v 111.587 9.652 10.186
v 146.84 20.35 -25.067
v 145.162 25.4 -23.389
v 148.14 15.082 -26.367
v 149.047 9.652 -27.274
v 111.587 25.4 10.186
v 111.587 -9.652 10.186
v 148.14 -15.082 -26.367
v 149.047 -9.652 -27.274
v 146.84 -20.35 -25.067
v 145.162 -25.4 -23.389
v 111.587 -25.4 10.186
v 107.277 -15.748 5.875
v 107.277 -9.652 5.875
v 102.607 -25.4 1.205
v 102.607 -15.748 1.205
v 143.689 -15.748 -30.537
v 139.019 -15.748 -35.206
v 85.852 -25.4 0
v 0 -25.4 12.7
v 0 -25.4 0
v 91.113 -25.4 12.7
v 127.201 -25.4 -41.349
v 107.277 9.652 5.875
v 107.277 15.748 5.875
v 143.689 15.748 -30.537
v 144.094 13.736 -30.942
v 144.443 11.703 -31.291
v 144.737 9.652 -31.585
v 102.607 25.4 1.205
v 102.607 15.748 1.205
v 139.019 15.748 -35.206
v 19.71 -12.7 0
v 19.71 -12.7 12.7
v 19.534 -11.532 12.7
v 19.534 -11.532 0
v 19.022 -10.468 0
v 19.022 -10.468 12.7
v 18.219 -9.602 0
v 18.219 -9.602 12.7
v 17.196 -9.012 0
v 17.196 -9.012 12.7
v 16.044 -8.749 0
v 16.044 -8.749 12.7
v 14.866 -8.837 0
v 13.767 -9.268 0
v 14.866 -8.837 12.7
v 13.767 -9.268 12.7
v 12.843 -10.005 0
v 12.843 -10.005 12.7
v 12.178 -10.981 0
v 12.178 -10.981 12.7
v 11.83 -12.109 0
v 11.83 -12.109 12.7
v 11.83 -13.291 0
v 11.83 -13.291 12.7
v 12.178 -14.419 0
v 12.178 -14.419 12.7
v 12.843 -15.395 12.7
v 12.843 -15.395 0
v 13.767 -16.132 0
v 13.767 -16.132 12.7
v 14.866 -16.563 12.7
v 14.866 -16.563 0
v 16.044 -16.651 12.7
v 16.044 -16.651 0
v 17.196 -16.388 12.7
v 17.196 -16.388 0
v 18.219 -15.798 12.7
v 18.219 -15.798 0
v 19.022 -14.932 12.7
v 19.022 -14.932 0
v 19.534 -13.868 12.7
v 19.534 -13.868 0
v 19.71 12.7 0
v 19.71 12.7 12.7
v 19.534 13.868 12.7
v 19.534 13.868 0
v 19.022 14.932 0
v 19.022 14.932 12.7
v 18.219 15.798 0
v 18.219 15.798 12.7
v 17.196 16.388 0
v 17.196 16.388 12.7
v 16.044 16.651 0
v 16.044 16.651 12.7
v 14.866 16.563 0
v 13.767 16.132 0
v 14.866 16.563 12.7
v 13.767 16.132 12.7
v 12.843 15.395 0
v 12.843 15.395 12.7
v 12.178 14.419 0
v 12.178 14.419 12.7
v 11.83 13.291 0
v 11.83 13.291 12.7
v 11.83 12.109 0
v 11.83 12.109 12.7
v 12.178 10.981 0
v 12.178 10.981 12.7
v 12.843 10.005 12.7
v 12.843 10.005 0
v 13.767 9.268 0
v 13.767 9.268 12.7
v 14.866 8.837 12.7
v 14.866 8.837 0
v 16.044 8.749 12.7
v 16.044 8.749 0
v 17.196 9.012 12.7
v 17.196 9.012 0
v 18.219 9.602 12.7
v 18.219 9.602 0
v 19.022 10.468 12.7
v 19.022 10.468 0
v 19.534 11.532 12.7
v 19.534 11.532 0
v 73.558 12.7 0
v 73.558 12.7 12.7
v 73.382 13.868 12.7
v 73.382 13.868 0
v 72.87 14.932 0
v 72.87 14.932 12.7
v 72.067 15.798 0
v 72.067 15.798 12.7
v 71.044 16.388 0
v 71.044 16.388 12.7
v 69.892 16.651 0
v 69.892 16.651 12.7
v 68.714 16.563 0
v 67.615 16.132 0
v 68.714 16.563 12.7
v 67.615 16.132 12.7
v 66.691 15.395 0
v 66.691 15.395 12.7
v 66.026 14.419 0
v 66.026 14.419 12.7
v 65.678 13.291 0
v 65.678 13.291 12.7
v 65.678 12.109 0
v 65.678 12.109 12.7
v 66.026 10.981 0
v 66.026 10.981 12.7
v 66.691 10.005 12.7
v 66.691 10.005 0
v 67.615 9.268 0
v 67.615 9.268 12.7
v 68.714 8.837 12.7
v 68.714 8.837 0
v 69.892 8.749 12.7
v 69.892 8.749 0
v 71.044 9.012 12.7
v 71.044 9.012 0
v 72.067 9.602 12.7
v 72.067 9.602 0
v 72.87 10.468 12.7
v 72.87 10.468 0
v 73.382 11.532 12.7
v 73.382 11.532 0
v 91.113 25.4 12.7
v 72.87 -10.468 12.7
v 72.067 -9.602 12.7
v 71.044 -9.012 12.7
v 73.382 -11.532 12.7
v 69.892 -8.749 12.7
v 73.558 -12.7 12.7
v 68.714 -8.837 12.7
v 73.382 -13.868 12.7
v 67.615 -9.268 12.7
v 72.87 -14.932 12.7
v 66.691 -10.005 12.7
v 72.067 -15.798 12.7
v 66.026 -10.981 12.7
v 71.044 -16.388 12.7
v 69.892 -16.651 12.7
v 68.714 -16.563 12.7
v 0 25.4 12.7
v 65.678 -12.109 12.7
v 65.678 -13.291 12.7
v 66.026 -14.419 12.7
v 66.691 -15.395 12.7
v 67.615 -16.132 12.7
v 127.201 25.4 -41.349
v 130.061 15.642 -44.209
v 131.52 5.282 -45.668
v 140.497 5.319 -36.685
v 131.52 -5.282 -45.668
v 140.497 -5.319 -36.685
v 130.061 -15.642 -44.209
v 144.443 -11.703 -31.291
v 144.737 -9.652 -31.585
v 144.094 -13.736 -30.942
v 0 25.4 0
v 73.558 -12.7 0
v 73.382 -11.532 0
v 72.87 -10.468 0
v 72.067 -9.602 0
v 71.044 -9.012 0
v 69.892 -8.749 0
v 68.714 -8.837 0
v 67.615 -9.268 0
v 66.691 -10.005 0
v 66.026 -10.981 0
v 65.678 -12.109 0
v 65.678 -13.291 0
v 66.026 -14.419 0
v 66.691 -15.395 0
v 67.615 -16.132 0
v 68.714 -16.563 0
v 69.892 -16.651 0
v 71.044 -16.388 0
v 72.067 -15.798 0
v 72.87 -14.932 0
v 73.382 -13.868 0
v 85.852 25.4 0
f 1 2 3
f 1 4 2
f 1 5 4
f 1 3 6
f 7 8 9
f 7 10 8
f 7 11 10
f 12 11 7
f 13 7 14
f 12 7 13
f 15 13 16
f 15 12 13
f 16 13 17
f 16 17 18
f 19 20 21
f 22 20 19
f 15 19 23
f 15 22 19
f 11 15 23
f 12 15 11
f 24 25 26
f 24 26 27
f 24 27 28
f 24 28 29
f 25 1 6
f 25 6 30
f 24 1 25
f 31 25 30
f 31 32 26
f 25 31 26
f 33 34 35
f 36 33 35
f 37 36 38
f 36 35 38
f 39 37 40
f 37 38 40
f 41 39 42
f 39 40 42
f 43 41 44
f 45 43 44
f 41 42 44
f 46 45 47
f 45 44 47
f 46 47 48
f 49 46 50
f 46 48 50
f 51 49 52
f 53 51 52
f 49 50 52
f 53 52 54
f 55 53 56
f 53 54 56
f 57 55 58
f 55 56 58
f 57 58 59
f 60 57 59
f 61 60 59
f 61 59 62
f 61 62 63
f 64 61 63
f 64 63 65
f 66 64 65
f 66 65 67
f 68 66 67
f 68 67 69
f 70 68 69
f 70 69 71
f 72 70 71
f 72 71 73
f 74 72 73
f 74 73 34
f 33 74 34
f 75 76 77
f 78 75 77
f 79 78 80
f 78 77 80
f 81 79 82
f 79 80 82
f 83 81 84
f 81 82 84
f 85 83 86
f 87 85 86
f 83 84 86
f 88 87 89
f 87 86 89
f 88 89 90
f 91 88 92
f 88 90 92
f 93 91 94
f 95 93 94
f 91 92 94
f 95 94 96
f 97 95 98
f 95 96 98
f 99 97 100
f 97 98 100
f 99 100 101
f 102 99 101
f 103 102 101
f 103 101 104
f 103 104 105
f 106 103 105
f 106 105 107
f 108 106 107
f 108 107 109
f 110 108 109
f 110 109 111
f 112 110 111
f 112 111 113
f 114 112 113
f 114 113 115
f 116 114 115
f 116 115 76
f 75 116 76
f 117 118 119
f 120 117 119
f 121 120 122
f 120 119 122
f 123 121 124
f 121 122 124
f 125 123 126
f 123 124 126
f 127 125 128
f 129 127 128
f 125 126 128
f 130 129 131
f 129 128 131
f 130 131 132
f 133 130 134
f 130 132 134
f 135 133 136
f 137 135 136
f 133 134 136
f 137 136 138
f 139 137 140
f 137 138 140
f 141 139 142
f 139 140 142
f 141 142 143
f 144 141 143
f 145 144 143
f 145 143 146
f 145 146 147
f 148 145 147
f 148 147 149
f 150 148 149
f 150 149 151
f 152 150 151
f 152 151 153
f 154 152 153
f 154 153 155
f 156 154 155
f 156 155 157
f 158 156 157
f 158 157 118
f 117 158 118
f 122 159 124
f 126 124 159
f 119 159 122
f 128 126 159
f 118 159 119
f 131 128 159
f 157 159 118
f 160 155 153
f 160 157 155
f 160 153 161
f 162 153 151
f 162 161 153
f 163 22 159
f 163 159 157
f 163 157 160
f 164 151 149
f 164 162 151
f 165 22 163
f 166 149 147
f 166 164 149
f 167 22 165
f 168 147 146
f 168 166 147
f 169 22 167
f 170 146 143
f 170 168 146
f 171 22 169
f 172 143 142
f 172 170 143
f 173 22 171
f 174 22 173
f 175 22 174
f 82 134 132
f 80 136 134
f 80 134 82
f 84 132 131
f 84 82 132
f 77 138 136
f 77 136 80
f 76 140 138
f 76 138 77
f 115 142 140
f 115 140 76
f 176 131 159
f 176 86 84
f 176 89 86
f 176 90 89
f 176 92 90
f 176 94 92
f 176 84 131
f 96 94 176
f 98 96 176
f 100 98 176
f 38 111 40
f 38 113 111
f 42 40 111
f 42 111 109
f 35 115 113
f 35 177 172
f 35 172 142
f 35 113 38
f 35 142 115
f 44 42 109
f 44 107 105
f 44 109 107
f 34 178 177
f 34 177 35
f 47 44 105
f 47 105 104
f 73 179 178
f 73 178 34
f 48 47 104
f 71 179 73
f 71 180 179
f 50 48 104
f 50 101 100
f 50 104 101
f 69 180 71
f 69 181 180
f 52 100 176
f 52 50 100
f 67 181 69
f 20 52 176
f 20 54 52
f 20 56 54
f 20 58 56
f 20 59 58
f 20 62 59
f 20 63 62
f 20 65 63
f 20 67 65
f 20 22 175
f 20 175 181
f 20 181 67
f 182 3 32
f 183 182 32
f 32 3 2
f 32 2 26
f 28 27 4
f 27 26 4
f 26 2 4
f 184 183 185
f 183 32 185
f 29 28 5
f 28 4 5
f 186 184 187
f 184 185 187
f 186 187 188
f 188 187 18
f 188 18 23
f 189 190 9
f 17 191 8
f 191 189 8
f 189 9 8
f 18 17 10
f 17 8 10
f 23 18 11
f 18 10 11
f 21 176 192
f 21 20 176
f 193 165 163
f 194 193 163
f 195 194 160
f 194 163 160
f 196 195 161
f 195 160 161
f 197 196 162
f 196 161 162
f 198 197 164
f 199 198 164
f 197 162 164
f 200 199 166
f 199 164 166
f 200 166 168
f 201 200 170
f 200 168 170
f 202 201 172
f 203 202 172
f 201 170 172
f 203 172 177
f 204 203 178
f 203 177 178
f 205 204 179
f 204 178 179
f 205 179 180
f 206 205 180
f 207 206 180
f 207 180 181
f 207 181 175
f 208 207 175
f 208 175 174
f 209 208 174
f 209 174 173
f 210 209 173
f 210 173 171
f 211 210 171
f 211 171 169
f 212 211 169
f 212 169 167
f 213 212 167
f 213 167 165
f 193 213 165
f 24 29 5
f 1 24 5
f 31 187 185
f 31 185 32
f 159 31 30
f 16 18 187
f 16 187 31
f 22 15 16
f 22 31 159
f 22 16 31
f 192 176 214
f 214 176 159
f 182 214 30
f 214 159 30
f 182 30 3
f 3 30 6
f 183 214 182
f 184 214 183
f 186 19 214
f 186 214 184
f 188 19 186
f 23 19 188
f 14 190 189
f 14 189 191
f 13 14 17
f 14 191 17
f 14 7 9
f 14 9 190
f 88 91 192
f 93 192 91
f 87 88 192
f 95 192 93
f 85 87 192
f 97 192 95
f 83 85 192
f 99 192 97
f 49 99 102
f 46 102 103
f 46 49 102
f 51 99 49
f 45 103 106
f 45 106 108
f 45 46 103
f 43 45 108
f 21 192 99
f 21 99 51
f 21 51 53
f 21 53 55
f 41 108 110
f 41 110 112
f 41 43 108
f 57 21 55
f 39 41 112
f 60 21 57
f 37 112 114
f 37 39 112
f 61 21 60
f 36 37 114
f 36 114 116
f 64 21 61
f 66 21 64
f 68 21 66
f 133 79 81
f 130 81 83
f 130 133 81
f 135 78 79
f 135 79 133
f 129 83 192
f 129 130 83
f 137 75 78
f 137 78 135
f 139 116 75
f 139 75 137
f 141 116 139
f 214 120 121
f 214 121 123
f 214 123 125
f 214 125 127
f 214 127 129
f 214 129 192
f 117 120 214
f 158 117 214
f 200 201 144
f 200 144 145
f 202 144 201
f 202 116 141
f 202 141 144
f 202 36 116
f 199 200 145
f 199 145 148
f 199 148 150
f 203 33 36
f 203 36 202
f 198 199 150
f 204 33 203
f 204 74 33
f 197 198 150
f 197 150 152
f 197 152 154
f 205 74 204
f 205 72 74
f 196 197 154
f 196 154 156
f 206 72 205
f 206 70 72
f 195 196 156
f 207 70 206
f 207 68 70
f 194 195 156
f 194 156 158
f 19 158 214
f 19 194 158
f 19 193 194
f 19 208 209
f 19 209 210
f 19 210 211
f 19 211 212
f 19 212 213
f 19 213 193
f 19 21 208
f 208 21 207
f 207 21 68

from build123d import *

# Parameters (mm, degrees)
F1_DEPTH = 25.4
F3_DEPTH = 134.5312752574
F5_DEPTH = 118.5292752574
F6_R     = 3.9624
F7_DEPTH = 58.5522699094


with BuildPart() as f1:
    # F0 (on Front) → F1 (new body, symmetric)
    with BuildSketch(Plane.XZ):
        Polygon((0, 12.7), (0, 0), (85.852, 0), (131.7032699094, -45.8512699094), (149.6637821515, -27.8907576672), (111.5874961982, 10.1855282861), (102.6072400771, 1.205272165), (91.1125122421, 12.7), align=None)
    extrude(amount=F1_DEPTH, both=True)

    # F2 (on face) → F3 (cut, through all)
    with BuildSketch(Plane(origin=(88.7772699094, 0, -88.7772699094), x_dir=(0, 1, 0), z_dir=(0.7071067812, 0, -0.7071067812))):
        Polygon((9.652, 86.1065313784), (-9.652, 86.1065313784), (-9.652, 80.0105313784), (-15.748, 80.0105313784), (-15.748, 73.4065313784), (15.748, 73.4065313784), (15.748, 80.0105313784), (9.652, 80.0105313784), align=None)
    extrude(amount=-F3_DEPTH, mode=Mode.SUBTRACT)

    # F4 (on face) → F5 (cut, through all)
    with BuildSketch(Plane(origin=(60.8865122421, 0, 60.8865122421), x_dir=(0.7071067812, 0, -0.7071067812), z_dir=(0.7071067812, 0, 0.7071067812))):
        with BuildLine():
            ThreePointArc((119.183037491, 25.4), (125.5500191363, 0), (119.183037491, -25.4))
            Line((119.183037491, -25.4), (119.183037491, -33.2152206612))
            Line((119.183037491, -33.2152206612), (139.840820311, -33.2152206612))
            Line((139.840820311, -33.2152206612), (139.840820311, 34.853566438))
            Line((139.840820311, 34.853566438), (119.183037491, 34.853566438))
            Line((119.183037491, 34.853566438), (119.183037491, 25.4))
        make_face()
    extrude(amount=-F5_DEPTH, mode=Mode.SUBTRACT)

    # F6 (on face) → F7 (cut, through all)
    with BuildSketch(Plane.XY.offset(12.7)):
        with Locations((15.748, 12.7)):
            Circle(F6_R)
        with Locations((15.748, -12.7)):
            Circle(F6_R)
        with Locations((69.596, -12.7)):
            Circle(F6_R)
        with Locations((69.596, 12.7)):
            Circle(F6_R)
    extrude(amount=-F7_DEPTH, mode=Mode.SUBTRACT)


solid = f1.part
